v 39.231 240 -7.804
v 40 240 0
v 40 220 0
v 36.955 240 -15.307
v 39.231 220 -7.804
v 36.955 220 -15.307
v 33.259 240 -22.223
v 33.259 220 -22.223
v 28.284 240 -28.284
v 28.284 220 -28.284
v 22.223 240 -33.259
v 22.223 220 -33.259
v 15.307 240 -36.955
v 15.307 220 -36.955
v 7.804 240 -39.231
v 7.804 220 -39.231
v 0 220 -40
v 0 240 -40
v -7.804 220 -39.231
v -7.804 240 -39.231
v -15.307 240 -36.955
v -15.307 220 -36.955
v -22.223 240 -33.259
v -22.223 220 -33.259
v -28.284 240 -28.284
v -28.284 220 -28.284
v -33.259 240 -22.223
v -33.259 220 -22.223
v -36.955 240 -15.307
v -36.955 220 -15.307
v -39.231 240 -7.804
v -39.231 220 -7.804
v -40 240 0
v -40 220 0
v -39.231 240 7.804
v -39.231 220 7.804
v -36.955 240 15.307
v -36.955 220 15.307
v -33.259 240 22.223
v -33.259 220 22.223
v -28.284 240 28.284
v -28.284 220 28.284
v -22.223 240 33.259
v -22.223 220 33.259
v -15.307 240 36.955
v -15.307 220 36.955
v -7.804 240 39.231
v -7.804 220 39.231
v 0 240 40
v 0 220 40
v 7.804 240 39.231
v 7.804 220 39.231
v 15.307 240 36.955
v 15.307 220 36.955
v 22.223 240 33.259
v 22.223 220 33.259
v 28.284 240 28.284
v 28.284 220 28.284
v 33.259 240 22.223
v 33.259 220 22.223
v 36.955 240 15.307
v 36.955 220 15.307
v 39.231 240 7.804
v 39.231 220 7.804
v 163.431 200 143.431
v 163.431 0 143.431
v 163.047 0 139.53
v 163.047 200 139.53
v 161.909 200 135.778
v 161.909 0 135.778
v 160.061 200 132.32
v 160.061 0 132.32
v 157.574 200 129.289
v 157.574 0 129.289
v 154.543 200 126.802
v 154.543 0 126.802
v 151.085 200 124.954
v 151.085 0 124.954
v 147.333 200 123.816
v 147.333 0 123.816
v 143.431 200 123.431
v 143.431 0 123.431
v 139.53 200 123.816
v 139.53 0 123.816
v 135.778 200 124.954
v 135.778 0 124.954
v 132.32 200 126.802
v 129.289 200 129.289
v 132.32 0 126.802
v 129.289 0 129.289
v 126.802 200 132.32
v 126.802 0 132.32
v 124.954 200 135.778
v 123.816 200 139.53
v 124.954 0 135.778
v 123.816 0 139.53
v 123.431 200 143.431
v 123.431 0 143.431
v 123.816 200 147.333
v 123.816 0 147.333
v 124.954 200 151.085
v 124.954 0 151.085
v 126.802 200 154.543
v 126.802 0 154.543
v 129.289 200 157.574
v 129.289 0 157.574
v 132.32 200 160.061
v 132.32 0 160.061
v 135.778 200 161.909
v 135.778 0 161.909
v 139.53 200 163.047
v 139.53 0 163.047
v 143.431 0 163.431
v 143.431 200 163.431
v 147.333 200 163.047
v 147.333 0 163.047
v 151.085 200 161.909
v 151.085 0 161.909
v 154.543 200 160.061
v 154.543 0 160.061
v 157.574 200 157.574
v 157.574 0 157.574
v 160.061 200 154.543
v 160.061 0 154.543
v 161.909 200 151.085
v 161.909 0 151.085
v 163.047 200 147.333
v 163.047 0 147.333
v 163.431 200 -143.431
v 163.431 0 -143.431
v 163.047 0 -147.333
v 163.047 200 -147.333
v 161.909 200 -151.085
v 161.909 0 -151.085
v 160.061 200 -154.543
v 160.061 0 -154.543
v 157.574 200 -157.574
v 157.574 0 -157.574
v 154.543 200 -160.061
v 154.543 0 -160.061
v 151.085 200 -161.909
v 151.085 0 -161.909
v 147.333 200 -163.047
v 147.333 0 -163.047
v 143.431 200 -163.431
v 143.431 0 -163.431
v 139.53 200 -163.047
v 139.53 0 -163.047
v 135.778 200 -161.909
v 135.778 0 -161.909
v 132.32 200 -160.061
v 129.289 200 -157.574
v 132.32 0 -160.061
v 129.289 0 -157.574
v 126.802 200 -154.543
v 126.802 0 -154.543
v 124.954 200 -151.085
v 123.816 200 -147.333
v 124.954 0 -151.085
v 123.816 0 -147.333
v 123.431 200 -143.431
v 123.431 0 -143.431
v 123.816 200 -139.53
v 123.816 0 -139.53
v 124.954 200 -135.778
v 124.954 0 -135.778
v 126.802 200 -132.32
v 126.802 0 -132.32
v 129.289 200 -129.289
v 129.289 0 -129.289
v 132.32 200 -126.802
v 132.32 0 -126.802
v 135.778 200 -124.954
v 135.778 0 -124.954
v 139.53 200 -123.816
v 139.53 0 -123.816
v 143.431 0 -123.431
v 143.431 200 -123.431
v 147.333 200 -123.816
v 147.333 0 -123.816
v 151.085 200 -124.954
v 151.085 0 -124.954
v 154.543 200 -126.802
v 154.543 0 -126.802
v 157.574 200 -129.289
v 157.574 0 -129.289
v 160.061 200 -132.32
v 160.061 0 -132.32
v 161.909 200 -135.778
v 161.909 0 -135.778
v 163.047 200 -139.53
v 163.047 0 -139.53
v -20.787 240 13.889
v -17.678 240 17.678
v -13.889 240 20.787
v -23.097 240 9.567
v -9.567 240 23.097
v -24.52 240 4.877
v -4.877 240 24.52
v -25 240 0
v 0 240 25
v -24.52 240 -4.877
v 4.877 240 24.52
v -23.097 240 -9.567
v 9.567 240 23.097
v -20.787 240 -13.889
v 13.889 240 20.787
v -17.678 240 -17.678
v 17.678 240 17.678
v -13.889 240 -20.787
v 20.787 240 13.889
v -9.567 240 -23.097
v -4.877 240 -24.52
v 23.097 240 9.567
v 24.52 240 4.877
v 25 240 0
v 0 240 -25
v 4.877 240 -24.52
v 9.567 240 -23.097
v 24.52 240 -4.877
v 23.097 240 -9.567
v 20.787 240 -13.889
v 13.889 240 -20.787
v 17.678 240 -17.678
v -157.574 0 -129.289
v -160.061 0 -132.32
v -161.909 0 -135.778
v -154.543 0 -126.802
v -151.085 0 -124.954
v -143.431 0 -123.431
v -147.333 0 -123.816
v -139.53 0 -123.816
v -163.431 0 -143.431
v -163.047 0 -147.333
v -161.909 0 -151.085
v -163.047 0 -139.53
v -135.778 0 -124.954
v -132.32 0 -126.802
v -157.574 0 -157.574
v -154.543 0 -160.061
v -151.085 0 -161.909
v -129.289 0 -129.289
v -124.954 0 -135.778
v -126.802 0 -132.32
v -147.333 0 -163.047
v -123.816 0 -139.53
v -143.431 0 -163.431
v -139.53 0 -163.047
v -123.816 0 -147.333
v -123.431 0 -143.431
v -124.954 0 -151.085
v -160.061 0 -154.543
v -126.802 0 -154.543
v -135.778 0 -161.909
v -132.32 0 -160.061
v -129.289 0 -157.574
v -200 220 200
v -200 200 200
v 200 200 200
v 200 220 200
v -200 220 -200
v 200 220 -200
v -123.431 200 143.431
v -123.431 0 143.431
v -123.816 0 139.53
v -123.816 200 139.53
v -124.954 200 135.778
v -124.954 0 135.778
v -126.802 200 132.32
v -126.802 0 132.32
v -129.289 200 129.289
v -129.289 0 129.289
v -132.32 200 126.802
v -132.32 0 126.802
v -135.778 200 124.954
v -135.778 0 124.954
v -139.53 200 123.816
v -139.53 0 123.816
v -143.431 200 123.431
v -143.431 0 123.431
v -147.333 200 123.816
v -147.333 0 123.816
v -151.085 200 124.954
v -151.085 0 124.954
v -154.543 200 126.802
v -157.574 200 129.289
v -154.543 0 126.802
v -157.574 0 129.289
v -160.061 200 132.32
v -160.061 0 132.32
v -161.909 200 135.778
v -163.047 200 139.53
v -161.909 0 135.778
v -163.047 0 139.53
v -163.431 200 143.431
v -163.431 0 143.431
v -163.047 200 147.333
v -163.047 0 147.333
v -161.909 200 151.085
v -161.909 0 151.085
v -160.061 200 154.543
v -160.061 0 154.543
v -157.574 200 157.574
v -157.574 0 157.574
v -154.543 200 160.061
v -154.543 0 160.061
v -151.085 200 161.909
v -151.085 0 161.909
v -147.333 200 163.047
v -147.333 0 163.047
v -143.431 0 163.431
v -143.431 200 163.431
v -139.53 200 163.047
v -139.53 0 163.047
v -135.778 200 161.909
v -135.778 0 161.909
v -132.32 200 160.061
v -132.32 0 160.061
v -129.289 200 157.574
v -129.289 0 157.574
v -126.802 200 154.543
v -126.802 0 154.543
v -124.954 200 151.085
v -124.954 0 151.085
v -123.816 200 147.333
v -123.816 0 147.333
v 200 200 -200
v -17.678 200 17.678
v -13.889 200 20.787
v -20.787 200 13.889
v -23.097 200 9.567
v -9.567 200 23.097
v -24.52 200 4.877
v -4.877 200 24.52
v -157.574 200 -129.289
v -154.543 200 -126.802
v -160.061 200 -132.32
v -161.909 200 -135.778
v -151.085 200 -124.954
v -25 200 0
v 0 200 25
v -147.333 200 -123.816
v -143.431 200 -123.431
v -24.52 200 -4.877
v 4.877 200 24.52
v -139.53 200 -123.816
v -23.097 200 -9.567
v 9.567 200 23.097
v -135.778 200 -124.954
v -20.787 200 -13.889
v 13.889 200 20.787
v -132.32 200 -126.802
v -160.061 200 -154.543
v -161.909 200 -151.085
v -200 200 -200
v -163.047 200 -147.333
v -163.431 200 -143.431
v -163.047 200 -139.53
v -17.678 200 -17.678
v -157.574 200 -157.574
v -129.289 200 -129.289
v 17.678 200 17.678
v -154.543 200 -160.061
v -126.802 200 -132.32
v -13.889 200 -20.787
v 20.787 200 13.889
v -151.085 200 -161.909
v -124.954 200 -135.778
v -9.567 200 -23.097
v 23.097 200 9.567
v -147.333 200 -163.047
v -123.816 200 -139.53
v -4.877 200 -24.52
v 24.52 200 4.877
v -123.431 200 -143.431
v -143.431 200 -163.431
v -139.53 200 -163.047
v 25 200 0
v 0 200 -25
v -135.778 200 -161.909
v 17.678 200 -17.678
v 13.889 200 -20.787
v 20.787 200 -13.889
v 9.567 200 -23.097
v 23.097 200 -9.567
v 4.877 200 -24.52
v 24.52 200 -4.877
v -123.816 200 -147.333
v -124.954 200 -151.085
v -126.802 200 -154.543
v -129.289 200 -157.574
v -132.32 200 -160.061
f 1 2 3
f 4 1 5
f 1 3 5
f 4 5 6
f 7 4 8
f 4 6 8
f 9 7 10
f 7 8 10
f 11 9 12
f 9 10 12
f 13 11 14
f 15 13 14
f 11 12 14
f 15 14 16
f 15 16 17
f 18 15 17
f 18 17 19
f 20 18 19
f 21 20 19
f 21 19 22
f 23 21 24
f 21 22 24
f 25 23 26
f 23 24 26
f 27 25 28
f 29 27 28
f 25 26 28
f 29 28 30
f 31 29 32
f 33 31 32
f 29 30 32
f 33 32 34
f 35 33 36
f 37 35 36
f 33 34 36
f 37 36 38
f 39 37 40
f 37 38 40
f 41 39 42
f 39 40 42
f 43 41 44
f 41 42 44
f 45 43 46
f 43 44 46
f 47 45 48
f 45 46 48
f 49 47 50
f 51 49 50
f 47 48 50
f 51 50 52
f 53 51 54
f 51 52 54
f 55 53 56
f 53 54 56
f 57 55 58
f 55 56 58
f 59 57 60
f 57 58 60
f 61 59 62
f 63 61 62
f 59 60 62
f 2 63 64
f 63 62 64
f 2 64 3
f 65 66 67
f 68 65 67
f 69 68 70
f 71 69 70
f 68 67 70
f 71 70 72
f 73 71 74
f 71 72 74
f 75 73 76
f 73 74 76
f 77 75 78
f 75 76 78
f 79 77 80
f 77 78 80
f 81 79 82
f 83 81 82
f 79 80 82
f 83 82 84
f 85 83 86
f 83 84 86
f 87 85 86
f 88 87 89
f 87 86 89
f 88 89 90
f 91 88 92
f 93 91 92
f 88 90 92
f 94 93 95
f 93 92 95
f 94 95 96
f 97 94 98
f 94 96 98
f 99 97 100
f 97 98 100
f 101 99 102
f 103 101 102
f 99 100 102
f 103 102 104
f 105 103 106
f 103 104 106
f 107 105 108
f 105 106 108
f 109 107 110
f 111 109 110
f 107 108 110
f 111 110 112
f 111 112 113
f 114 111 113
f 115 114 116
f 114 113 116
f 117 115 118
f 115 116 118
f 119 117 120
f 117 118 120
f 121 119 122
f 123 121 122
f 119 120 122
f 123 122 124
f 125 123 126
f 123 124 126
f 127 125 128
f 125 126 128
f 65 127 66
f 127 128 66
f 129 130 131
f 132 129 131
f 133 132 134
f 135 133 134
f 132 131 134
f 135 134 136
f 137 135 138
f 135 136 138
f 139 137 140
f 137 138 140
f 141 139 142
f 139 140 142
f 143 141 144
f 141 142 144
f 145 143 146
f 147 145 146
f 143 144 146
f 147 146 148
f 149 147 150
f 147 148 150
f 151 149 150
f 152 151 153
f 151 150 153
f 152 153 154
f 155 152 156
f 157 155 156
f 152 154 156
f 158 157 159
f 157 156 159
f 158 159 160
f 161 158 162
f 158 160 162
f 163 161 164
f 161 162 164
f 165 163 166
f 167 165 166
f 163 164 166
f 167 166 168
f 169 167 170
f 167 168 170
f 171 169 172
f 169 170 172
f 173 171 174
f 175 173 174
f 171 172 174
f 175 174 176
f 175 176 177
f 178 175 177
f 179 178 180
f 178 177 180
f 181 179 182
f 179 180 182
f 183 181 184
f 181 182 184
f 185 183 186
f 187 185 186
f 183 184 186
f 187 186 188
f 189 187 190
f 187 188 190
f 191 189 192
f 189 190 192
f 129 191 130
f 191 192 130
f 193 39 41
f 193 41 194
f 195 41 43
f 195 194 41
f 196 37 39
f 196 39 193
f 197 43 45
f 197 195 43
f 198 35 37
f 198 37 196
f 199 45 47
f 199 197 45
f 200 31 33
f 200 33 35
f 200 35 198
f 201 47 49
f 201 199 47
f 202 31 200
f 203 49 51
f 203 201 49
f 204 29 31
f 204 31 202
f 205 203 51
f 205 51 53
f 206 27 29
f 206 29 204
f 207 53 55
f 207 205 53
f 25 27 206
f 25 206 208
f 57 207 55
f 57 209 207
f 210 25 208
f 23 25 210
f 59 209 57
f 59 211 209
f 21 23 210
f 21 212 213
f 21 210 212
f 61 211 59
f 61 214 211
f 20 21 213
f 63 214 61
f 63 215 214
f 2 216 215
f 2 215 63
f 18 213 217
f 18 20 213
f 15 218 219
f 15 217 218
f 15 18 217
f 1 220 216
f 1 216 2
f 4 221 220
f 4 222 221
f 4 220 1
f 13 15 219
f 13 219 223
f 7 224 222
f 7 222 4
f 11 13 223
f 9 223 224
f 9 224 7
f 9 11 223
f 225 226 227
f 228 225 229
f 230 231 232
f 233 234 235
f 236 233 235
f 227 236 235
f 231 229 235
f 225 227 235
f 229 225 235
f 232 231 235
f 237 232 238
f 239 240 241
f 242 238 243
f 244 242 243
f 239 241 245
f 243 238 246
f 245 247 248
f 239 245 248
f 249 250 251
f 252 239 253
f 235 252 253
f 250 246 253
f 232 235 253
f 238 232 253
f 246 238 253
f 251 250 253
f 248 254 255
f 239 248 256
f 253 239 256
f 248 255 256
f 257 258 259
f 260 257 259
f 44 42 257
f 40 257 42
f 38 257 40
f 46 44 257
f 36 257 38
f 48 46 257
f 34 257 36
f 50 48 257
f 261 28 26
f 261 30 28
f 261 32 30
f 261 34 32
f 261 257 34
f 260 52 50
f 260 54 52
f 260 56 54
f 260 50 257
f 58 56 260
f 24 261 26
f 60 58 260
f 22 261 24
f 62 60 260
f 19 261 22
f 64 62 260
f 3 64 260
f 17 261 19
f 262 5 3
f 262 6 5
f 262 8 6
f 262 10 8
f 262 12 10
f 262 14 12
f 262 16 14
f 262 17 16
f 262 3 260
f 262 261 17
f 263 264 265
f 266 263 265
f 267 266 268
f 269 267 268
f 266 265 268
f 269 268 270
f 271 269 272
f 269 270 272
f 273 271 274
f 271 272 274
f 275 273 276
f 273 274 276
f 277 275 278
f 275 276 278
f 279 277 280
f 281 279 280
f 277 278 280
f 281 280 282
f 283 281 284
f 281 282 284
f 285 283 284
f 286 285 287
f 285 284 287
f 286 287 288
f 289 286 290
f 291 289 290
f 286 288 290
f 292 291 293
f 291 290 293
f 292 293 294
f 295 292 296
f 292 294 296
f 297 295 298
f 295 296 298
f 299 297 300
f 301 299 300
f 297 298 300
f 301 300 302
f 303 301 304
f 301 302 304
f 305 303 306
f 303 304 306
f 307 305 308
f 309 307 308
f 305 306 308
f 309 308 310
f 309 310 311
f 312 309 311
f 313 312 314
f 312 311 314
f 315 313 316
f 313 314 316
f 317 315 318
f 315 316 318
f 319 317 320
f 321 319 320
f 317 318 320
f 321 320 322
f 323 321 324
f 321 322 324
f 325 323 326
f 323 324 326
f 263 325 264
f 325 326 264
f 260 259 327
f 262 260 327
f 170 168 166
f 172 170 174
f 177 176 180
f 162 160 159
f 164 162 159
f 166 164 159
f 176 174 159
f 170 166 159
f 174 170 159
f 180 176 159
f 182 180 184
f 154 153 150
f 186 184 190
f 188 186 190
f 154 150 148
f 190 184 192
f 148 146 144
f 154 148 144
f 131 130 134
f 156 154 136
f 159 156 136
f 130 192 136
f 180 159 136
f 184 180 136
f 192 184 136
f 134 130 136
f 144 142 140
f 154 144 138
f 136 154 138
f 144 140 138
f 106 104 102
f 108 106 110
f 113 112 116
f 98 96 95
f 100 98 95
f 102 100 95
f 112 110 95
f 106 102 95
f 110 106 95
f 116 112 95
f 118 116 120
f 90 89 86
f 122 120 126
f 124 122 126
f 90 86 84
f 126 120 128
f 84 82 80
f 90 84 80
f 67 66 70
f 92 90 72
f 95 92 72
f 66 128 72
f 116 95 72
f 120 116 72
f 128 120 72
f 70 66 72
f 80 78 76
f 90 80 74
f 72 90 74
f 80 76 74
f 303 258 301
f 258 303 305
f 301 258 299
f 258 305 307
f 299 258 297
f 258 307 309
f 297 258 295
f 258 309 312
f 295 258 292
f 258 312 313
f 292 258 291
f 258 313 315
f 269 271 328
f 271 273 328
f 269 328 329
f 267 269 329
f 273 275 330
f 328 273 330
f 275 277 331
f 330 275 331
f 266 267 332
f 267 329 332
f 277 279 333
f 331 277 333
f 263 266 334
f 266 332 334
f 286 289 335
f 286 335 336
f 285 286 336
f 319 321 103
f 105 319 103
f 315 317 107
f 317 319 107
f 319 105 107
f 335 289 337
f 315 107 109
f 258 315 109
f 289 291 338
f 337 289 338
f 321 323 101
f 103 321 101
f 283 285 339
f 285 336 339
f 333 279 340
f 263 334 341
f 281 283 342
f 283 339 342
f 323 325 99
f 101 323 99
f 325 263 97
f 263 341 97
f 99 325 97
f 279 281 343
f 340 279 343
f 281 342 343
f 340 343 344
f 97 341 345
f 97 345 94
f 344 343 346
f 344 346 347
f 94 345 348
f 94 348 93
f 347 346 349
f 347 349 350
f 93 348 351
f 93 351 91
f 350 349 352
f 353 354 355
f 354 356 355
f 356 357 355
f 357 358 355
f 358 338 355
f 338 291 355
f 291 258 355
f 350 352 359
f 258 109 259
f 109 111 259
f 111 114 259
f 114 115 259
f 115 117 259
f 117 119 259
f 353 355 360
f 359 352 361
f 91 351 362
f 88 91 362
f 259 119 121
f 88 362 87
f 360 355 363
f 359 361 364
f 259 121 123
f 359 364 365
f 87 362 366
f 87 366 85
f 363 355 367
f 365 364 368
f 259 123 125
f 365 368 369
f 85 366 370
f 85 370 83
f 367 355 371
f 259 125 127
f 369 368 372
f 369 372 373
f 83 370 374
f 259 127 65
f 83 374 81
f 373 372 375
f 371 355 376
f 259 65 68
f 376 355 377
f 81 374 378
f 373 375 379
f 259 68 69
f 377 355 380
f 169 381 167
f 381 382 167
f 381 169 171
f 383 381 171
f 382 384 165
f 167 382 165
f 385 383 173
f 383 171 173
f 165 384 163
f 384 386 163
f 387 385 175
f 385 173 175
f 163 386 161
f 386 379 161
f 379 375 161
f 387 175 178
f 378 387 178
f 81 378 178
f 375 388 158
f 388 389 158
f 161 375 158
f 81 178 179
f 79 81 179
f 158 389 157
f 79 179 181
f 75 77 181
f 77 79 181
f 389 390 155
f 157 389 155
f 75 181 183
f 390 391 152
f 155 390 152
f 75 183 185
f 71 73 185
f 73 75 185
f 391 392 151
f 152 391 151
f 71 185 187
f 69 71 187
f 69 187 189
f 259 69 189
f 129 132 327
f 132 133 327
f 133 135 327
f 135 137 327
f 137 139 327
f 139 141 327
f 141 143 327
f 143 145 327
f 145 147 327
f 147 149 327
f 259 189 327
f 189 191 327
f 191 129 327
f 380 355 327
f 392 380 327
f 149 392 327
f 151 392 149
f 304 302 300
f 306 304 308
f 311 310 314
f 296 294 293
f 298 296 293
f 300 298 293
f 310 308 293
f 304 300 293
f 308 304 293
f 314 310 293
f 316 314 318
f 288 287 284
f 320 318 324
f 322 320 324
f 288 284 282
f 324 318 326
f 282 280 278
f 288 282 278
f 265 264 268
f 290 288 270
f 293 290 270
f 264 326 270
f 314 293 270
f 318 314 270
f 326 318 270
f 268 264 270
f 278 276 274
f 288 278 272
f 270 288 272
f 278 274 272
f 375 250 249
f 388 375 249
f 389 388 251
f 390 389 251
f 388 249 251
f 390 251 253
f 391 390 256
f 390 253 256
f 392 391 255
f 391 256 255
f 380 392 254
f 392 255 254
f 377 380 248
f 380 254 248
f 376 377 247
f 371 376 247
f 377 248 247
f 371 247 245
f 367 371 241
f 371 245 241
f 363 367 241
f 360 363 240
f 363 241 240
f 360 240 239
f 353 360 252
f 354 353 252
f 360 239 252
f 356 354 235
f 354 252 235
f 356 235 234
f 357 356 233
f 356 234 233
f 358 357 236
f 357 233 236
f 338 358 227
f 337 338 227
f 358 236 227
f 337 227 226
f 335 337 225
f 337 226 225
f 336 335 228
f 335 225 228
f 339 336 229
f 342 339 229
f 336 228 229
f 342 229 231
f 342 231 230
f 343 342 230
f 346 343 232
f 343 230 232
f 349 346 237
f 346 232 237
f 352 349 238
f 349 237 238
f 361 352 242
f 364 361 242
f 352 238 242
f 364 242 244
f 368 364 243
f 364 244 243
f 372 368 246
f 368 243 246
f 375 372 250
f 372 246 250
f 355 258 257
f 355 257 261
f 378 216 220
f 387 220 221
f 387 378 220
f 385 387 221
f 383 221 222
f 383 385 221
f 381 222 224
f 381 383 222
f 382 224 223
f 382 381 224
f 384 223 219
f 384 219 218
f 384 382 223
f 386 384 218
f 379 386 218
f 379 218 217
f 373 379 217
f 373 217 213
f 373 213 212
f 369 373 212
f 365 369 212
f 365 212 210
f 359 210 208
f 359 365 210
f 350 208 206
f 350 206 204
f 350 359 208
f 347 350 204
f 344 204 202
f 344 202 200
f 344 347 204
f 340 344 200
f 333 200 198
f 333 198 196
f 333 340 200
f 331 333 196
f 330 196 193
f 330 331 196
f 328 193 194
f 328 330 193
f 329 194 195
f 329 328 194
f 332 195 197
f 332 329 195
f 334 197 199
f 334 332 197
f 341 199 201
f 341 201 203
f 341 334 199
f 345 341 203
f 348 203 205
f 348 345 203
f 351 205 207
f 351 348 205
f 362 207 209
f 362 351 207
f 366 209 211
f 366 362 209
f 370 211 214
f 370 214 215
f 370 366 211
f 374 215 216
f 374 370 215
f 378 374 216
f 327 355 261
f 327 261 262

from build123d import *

# Parameters (mm, degrees)
SKETCH1_R             = 20
BOSS_EXTRUDE1_DEPTH   = 200
BOSS_EXTRUDE1_2_DEPTH = 200
BOSS_EXTRUDE1_3_DEPTH = 200
BOSS_EXTRUDE1_4_DEPTH = 200
SKETCH2_W             = 400
SKETCH2_H             = 400
SKETCH2_R             = 25
BOSS_EXTRUDE2_DEPTH   = 20
SKETCH3_R             = 40
SKETCH3_R_2           = 25
BOSS_EXTRUDE3_DEPTH   = 20


with BuildPart() as part:
    # Sketch1 → Boss-Extrude1 (new body)
    with BuildSketch(Plane(origin=(0, 0, 0), x_dir=(1, 0, 0), z_dir=(0, 1, 0))):
        with Locations((-143.431457505, 143.431457505)):
            Circle(SKETCH1_R)
    extrude(amount=BOSS_EXTRUDE1_DEPTH)



with BuildPart() as body_2:
    # Sketch1 → Boss-Extrude1 2 (new body)
    with BuildSketch(Plane(origin=(0, 0, 0), x_dir=(1, 0, 0), z_dir=(0, 1, 0))):
        with Locations((-143.431457505, -143.431457505)):
            Circle(SKETCH1_R)
    extrude(amount=BOSS_EXTRUDE1_2_DEPTH)


with BuildPart() as body_3:
    # Sketch1 → Boss-Extrude1 3 (new body)
    with BuildSketch(Plane(origin=(0, 0, 0), x_dir=(1, 0, 0), z_dir=(0, 1, 0))):
        with Locations((143.431457505, -143.431457505)):
            Circle(SKETCH1_R)
    extrude(amount=BOSS_EXTRUDE1_3_DEPTH)


with BuildPart() as body_4:
    # Sketch1 → Boss-Extrude1 4 (new body)
    with BuildSketch(Plane(origin=(0, 0, 0), x_dir=(1, 0, 0), z_dir=(0, 1, 0))):
        with Locations((143.431457505, 143.431457505)):
            Circle(SKETCH1_R)
    extrude(amount=BOSS_EXTRUDE1_4_DEPTH)


with BuildPart() as part_1:
    add(part.part)

    add(body_2.part)  # Boss-Extrude2 merges body 2

    add(body_3.part)  # Boss-Extrude2 merges body 3

    add(body_4.part)  # Boss-Extrude2 merges body 4
    # Sketch2 → Boss-Extrude2 (add)
    with BuildSketch(Plane(origin=(0, 200, 0), x_dir=(1, 0, 0), z_dir=(0, 1, 0))):
        Rectangle(SKETCH2_W, SKETCH2_H)
        Circle(SKETCH2_R, mode=Mode.SUBTRACT)
    extrude(amount=BOSS_EXTRUDE2_DEPTH)

    # Sketch3 → Boss-Extrude3 (add)
    with BuildSketch(Plane(origin=(0, 220, 0), x_dir=(1, 0, 0), z_dir=(0, 1, 0))):
        Circle(SKETCH3_R)
        Circle(SKETCH3_R_2, mode=Mode.SUBTRACT)
    extrude(amount=BOSS_EXTRUDE3_DEPTH)


solid = part_1.part
